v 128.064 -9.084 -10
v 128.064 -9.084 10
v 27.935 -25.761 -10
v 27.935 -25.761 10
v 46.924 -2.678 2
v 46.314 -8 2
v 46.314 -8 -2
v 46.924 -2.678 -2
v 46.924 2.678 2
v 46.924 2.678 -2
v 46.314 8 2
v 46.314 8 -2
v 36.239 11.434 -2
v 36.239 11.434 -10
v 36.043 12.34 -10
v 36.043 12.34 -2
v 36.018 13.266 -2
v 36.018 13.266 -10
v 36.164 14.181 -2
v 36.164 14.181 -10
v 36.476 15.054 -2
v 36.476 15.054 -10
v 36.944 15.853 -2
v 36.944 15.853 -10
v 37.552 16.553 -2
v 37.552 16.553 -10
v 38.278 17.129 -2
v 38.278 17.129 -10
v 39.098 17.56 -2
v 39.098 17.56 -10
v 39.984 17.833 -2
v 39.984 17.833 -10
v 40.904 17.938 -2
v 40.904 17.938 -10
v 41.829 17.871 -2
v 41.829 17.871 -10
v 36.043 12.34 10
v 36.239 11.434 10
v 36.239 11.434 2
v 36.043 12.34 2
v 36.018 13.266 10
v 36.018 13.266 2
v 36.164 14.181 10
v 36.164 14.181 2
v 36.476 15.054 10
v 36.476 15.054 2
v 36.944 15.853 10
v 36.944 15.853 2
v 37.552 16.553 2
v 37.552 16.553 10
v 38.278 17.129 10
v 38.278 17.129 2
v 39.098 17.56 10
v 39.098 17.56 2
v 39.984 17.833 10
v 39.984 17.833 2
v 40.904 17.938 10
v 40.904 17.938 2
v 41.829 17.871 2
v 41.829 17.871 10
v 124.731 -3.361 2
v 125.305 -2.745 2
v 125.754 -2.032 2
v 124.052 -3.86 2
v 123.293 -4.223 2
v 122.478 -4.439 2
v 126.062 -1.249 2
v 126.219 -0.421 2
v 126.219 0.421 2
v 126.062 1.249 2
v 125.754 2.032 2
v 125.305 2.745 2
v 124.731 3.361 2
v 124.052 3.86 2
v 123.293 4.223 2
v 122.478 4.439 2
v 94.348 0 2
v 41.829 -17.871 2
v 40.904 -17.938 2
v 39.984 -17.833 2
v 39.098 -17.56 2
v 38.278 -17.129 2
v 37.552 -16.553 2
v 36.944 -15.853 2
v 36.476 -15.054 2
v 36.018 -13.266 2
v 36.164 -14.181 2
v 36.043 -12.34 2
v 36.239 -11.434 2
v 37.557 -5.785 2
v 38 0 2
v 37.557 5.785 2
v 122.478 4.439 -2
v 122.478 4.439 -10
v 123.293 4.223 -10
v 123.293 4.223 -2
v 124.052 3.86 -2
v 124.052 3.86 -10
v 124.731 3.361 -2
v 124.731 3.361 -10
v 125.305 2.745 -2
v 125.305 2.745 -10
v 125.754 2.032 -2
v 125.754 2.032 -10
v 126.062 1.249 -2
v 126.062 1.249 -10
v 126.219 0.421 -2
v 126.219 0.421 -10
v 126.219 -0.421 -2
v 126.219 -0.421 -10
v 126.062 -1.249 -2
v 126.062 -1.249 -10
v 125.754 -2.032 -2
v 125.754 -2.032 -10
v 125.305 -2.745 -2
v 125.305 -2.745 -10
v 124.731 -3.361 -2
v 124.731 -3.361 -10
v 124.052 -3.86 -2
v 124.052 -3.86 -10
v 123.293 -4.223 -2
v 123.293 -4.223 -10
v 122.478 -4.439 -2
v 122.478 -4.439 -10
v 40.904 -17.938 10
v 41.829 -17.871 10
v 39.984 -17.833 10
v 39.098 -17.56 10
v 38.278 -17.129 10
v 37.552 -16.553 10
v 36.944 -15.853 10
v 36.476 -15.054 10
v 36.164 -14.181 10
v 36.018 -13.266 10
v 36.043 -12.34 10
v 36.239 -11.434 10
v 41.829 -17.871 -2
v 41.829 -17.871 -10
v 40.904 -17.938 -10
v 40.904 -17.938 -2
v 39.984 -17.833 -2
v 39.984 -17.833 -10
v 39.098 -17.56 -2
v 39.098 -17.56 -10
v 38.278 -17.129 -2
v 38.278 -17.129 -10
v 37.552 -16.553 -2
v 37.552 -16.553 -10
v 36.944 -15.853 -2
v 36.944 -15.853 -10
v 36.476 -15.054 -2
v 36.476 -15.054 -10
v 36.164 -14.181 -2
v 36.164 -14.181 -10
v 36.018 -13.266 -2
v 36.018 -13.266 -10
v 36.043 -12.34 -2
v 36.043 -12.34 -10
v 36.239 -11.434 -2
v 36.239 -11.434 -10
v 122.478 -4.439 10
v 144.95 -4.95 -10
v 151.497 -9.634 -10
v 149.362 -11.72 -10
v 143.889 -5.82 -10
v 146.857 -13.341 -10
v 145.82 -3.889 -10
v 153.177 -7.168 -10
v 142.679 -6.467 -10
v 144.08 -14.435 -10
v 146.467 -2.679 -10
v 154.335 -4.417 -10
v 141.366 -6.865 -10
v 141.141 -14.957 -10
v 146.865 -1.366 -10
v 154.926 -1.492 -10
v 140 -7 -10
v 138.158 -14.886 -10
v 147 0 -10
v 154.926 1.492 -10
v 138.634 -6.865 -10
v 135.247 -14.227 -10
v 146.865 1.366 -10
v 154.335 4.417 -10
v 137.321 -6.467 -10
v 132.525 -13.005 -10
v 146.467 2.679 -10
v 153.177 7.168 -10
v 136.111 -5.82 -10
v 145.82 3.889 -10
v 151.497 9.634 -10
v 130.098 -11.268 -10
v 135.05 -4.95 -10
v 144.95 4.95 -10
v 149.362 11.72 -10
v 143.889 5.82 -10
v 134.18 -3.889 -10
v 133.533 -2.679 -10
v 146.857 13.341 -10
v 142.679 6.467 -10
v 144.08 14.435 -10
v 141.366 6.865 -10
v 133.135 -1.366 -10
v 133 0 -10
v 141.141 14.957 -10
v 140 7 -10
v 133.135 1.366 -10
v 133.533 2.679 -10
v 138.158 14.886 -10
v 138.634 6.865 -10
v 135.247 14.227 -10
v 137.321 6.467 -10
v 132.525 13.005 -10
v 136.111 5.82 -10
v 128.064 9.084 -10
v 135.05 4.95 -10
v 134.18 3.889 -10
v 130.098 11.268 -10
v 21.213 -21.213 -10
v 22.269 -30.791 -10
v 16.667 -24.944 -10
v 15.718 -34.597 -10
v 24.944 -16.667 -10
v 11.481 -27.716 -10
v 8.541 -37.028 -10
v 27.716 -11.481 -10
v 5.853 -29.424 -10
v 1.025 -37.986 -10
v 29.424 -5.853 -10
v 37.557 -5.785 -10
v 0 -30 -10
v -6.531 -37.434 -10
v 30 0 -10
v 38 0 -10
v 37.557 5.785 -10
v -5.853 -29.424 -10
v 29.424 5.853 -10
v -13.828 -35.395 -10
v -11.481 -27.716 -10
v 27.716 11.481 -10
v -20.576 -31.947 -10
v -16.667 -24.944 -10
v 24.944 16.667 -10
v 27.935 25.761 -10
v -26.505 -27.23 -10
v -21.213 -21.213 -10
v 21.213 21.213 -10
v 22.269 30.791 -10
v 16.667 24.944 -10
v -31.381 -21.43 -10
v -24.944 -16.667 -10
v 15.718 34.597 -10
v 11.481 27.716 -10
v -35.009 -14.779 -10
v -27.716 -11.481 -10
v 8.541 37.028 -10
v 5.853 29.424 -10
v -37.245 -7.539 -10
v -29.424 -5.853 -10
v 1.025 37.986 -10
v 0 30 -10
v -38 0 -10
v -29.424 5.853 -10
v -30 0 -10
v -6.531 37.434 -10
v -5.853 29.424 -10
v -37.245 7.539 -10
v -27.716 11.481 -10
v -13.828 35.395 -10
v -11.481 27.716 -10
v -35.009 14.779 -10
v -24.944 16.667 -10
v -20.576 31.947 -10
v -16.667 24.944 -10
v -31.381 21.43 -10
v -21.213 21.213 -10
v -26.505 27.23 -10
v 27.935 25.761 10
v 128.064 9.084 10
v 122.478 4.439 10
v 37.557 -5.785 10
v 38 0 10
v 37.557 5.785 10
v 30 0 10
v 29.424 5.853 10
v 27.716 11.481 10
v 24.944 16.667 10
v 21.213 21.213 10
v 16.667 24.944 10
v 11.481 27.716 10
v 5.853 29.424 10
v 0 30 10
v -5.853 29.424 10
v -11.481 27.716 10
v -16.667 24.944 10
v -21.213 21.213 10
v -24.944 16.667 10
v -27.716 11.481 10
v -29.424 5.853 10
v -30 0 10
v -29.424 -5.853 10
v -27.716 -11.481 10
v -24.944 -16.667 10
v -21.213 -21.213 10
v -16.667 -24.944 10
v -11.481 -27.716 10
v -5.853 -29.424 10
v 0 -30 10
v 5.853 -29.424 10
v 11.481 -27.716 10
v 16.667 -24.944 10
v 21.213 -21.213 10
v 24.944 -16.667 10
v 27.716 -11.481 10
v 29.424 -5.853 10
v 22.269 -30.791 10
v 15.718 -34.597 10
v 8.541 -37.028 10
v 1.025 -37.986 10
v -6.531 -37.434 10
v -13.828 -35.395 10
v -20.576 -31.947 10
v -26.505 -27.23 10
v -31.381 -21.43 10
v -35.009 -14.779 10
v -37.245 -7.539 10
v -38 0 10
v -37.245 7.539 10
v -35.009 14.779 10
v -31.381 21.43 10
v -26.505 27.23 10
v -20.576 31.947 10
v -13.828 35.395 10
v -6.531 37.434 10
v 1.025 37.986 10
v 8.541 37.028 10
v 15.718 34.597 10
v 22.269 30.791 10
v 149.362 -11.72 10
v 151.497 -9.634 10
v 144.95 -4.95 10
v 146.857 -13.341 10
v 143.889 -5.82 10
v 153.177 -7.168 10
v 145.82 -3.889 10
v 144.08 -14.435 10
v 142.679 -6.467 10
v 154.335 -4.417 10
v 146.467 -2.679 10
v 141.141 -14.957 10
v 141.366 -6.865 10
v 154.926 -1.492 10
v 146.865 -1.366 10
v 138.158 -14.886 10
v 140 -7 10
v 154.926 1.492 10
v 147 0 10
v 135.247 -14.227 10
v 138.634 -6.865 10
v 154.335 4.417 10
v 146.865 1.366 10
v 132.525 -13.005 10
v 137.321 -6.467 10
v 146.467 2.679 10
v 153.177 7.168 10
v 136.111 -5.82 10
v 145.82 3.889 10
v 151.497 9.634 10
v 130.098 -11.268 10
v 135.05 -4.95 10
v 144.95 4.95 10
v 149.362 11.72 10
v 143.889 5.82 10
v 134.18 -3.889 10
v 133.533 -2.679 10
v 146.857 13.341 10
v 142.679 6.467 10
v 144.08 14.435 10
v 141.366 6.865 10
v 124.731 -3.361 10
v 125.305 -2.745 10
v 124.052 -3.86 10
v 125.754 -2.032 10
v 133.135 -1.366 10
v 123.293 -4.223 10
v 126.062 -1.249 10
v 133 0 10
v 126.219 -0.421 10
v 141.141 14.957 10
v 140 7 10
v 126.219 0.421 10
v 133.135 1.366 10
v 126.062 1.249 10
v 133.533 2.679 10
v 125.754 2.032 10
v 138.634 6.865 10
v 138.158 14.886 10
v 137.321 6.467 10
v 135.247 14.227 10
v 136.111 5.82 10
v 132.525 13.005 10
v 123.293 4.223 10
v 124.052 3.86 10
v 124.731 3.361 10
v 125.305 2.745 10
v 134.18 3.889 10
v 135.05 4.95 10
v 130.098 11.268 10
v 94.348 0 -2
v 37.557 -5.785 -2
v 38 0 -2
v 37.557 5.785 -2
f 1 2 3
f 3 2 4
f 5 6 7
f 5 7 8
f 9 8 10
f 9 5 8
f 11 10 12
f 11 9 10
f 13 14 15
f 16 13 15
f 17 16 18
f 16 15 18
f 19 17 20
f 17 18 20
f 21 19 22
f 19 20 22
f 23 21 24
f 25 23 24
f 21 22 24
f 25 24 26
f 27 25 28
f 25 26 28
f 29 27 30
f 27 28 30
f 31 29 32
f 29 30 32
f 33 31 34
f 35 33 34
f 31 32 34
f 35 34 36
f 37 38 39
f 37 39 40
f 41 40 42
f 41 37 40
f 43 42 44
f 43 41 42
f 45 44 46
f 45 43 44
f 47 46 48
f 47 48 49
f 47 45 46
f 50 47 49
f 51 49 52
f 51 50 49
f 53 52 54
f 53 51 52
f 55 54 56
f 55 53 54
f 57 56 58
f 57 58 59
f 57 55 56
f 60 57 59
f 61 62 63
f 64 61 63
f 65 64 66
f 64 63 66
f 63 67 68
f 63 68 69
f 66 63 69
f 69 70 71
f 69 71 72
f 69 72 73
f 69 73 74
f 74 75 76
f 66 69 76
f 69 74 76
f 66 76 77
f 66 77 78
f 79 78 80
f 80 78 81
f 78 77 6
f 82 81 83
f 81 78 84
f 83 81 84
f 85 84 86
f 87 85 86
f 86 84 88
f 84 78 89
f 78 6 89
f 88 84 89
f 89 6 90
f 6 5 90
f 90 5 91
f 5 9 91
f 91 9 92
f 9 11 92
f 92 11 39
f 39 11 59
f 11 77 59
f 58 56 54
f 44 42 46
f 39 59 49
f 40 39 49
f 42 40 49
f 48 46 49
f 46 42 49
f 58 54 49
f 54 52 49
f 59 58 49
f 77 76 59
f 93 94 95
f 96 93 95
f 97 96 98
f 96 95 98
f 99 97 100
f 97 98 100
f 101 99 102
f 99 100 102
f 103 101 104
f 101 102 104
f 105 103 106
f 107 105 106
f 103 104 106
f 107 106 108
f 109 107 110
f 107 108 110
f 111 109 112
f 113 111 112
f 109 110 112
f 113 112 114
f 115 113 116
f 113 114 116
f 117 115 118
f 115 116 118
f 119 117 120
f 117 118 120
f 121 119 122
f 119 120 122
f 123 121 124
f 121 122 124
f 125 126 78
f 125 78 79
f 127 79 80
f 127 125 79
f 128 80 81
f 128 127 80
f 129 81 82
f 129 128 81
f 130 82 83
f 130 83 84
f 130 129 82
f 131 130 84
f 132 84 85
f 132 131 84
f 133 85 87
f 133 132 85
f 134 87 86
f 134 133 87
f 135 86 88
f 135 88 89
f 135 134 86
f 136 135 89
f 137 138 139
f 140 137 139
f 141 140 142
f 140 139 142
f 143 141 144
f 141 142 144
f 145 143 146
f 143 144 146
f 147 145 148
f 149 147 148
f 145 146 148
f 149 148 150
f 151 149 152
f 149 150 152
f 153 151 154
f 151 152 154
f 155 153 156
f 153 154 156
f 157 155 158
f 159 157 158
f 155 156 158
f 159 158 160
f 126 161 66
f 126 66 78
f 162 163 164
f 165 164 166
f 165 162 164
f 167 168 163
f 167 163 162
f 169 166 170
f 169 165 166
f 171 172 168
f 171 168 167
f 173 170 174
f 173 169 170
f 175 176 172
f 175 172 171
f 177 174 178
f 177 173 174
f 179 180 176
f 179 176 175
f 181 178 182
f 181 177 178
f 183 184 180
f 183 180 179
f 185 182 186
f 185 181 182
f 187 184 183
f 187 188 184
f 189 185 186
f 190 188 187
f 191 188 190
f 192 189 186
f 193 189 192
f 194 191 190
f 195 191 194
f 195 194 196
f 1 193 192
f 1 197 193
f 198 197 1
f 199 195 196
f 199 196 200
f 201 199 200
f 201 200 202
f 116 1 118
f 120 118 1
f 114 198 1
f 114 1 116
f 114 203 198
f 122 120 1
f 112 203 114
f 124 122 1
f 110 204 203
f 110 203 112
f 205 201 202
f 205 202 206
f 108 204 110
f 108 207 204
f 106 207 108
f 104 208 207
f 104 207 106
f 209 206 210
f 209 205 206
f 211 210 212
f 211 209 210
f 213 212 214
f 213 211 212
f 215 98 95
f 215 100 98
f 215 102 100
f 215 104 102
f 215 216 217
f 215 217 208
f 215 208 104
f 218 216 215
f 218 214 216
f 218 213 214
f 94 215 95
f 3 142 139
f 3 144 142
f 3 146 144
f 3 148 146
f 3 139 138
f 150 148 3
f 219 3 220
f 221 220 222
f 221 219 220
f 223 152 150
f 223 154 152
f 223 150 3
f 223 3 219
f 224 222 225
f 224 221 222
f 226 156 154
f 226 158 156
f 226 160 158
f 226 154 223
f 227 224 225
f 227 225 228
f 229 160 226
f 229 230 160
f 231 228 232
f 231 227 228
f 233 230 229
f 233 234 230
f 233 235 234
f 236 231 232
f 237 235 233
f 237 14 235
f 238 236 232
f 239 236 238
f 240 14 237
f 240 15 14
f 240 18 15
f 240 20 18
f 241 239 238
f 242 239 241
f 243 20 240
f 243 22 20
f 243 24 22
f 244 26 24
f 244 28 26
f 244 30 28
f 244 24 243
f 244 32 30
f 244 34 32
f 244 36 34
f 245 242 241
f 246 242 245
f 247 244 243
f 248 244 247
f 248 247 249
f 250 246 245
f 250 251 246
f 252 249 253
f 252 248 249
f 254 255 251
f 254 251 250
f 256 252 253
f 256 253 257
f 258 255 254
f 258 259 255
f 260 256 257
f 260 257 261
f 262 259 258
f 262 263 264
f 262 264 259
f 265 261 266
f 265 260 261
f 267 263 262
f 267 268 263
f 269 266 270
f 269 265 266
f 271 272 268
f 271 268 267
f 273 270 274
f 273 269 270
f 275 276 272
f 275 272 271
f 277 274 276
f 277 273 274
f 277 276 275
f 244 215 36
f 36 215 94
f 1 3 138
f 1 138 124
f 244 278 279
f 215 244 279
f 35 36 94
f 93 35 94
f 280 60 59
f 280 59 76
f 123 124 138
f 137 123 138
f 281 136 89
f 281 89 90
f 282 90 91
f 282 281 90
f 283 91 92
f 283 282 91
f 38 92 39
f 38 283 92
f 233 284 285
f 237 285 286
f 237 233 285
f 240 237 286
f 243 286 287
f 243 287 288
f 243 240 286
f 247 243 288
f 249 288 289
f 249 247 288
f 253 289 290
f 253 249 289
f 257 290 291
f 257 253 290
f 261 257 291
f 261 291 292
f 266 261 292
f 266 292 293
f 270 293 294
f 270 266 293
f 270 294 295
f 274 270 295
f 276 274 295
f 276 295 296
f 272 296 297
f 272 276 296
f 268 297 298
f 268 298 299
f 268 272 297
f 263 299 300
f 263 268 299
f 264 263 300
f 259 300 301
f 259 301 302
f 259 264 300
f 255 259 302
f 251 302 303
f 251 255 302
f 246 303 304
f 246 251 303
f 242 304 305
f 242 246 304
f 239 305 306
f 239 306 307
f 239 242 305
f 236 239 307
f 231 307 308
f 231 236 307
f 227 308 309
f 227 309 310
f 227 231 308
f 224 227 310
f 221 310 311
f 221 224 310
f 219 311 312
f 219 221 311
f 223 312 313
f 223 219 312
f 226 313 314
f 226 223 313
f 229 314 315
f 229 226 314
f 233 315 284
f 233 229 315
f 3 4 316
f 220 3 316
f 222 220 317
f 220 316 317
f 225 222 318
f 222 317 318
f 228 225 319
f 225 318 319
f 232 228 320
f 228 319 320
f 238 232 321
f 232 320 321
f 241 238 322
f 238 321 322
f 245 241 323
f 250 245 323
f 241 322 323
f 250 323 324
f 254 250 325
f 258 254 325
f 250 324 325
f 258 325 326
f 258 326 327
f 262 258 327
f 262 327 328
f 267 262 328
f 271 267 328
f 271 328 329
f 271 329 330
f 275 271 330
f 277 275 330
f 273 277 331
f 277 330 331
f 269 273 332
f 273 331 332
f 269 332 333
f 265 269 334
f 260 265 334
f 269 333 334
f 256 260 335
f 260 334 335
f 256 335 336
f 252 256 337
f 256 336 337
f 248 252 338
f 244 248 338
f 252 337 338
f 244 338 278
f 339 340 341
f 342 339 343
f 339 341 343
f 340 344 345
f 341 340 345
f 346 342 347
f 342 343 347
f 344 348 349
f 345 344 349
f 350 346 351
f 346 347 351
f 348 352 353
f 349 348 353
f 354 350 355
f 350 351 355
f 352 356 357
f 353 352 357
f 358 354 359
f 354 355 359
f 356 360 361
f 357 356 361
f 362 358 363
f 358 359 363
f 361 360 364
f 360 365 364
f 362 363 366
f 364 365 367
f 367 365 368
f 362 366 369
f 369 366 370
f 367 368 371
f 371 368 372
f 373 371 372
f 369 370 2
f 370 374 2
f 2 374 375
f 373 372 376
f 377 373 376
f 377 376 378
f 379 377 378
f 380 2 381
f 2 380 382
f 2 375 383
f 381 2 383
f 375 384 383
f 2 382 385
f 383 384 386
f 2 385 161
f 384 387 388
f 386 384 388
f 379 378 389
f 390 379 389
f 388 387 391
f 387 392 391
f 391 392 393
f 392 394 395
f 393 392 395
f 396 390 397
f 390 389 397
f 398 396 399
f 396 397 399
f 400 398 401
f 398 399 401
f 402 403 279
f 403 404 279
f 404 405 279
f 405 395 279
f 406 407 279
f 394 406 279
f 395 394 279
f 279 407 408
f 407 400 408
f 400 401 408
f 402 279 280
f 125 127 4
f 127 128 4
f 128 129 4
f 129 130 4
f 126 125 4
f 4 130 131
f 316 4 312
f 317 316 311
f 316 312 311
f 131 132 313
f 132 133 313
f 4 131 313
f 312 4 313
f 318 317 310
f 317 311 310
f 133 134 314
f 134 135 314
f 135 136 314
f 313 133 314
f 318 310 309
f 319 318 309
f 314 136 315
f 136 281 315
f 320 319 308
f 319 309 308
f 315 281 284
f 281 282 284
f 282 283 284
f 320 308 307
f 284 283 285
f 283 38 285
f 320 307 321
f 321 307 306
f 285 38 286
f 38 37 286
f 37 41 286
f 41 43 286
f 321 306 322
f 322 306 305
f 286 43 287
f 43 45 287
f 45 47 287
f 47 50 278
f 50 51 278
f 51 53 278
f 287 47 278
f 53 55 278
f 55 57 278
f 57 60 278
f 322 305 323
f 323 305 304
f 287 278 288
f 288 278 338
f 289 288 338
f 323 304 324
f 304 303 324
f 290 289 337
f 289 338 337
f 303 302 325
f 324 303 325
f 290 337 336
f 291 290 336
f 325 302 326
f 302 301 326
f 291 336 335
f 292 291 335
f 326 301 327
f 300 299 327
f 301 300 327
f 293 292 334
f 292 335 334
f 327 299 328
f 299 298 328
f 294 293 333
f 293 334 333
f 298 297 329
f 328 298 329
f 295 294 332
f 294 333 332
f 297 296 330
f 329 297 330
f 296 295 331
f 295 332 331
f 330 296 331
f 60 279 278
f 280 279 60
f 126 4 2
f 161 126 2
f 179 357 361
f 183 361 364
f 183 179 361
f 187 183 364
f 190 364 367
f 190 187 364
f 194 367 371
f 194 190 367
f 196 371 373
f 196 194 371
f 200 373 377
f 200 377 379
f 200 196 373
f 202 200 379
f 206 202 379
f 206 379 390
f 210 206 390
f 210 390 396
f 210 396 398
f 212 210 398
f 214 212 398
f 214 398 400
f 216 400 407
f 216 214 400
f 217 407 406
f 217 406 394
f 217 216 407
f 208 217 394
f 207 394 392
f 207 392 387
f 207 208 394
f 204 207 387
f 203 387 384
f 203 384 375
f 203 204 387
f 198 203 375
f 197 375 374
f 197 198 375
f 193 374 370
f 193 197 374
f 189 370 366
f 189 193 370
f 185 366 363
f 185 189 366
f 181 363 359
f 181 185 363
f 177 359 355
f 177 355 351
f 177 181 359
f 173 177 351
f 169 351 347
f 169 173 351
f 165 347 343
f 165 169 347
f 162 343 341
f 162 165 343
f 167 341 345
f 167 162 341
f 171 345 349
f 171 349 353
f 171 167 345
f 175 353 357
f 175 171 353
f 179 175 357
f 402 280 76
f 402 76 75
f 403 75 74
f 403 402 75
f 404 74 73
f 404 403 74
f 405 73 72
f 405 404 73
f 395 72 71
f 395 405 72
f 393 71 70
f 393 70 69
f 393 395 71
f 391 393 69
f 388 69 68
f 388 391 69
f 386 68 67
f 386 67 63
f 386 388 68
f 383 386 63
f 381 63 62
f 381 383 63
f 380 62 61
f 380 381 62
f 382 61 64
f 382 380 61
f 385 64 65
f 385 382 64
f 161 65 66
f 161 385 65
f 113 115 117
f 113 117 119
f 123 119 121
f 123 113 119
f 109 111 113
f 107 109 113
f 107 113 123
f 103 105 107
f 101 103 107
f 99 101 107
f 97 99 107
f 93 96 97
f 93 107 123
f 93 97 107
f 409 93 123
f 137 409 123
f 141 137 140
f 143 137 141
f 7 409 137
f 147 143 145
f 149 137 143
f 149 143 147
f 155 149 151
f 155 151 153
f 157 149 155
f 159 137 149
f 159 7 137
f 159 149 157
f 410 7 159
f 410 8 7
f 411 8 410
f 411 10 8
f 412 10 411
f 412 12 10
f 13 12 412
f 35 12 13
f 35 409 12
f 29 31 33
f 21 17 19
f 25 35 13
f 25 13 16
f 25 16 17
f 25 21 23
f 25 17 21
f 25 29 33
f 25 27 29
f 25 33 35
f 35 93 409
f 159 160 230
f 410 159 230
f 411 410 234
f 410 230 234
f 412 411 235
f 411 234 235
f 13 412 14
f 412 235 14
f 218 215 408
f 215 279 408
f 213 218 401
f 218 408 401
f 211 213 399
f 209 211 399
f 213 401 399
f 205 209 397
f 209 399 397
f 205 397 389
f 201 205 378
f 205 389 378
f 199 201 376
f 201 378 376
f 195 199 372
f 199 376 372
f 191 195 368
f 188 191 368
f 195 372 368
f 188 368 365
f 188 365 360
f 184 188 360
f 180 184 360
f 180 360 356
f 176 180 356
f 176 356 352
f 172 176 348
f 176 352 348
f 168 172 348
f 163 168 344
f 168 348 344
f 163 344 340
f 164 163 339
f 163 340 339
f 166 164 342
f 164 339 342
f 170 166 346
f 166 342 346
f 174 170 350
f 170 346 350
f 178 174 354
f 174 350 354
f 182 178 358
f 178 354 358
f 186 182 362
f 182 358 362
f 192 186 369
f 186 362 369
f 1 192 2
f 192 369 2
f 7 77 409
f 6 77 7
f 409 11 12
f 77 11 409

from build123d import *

# Parameters (mm, degrees)
SKETCH1_R           = 30
SKETCH1_R_2         = 7
BOSS_EXTRUDE1_DEPTH = 10
CUT_EXTRUDE1_DEPTH  = 8
CUT_EXTRUDE2_DEPTH  = 161.040619844


with BuildPart() as part:
    # Sketch1 → Boss-Extrude1 (new, symmetric)
    with BuildSketch(Plane.XY):
        with BuildLine():
            Line((27.935473676, 25.760615491), (128.063755469, 9.084385863))
            ThreePointArc((128.063755469, 9.084385863), (155, 0), (128.063755469, -9.084385863))
            Line((128.063755469, -9.084385863), (27.935473676, -25.760615491))
            ThreePointArc((27.935473676, -25.760615491), (-38, 0), (27.935473676, 25.760615491))
        make_face()
        Circle(SKETCH1_R, mode=Mode.SUBTRACT)
        with Locations((140, 0)):
            Circle(SKETCH1_R_2, mode=Mode.SUBTRACT)
    extrude(amount=BOSS_EXTRUDE1_DEPTH, both=True)

    # Sketch2 → Cut-Extrude1 (cut)
    with BuildSketch(Plane.XY.offset(10)):
        with BuildLine():
            Line((41.828554558, 17.870982725), (122.478416149, 4.438857582))
            ThreePointArc((122.478416149, 4.438857582), (126.239130435, 0), (122.478416149, -4.438857582))
            Line((122.478416149, -4.438857582), (41.828554558, -17.870982725))
            ThreePointArc((41.828554558, -17.870982725), (37.231968897, -16.217361812), (36.238855523, -11.43439331))
            ThreePointArc((36.238855523, -11.43439331), (38, 0), (36.238855523, 11.43439331))
            ThreePointArc((36.238855523, 11.43439331), (37.231968897, 16.217361812), (41.828554558, 17.870982725))
        make_face()
    cut_extrude1 = extrude(amount=-CUT_EXTRUDE1_DEPTH, mode=Mode.SUBTRACT)

    # Mirror1: Cut-Extrude1 across plane
    add(cut_extrude1.mirror(Plane.XY), mode=Mode.SUBTRACT)

    # Sketch3 → Cut-Extrude2 (cut, through all)
    with BuildSketch(Plane.XY.offset(2)):
        with BuildLine():
            ThreePointArc((46.314154572, -7.999942891), (47, 0), (46.314154572, 7.999942891))
            Line((46.314154572, 7.999942891), (94.347826087, 0))
            Line((94.347826087, 0), (46.314154572, -7.999942891))
        make_face()
    extrude(amount=-CUT_EXTRUDE2_DEPTH, mode=Mode.SUBTRACT)


solid = part.part
